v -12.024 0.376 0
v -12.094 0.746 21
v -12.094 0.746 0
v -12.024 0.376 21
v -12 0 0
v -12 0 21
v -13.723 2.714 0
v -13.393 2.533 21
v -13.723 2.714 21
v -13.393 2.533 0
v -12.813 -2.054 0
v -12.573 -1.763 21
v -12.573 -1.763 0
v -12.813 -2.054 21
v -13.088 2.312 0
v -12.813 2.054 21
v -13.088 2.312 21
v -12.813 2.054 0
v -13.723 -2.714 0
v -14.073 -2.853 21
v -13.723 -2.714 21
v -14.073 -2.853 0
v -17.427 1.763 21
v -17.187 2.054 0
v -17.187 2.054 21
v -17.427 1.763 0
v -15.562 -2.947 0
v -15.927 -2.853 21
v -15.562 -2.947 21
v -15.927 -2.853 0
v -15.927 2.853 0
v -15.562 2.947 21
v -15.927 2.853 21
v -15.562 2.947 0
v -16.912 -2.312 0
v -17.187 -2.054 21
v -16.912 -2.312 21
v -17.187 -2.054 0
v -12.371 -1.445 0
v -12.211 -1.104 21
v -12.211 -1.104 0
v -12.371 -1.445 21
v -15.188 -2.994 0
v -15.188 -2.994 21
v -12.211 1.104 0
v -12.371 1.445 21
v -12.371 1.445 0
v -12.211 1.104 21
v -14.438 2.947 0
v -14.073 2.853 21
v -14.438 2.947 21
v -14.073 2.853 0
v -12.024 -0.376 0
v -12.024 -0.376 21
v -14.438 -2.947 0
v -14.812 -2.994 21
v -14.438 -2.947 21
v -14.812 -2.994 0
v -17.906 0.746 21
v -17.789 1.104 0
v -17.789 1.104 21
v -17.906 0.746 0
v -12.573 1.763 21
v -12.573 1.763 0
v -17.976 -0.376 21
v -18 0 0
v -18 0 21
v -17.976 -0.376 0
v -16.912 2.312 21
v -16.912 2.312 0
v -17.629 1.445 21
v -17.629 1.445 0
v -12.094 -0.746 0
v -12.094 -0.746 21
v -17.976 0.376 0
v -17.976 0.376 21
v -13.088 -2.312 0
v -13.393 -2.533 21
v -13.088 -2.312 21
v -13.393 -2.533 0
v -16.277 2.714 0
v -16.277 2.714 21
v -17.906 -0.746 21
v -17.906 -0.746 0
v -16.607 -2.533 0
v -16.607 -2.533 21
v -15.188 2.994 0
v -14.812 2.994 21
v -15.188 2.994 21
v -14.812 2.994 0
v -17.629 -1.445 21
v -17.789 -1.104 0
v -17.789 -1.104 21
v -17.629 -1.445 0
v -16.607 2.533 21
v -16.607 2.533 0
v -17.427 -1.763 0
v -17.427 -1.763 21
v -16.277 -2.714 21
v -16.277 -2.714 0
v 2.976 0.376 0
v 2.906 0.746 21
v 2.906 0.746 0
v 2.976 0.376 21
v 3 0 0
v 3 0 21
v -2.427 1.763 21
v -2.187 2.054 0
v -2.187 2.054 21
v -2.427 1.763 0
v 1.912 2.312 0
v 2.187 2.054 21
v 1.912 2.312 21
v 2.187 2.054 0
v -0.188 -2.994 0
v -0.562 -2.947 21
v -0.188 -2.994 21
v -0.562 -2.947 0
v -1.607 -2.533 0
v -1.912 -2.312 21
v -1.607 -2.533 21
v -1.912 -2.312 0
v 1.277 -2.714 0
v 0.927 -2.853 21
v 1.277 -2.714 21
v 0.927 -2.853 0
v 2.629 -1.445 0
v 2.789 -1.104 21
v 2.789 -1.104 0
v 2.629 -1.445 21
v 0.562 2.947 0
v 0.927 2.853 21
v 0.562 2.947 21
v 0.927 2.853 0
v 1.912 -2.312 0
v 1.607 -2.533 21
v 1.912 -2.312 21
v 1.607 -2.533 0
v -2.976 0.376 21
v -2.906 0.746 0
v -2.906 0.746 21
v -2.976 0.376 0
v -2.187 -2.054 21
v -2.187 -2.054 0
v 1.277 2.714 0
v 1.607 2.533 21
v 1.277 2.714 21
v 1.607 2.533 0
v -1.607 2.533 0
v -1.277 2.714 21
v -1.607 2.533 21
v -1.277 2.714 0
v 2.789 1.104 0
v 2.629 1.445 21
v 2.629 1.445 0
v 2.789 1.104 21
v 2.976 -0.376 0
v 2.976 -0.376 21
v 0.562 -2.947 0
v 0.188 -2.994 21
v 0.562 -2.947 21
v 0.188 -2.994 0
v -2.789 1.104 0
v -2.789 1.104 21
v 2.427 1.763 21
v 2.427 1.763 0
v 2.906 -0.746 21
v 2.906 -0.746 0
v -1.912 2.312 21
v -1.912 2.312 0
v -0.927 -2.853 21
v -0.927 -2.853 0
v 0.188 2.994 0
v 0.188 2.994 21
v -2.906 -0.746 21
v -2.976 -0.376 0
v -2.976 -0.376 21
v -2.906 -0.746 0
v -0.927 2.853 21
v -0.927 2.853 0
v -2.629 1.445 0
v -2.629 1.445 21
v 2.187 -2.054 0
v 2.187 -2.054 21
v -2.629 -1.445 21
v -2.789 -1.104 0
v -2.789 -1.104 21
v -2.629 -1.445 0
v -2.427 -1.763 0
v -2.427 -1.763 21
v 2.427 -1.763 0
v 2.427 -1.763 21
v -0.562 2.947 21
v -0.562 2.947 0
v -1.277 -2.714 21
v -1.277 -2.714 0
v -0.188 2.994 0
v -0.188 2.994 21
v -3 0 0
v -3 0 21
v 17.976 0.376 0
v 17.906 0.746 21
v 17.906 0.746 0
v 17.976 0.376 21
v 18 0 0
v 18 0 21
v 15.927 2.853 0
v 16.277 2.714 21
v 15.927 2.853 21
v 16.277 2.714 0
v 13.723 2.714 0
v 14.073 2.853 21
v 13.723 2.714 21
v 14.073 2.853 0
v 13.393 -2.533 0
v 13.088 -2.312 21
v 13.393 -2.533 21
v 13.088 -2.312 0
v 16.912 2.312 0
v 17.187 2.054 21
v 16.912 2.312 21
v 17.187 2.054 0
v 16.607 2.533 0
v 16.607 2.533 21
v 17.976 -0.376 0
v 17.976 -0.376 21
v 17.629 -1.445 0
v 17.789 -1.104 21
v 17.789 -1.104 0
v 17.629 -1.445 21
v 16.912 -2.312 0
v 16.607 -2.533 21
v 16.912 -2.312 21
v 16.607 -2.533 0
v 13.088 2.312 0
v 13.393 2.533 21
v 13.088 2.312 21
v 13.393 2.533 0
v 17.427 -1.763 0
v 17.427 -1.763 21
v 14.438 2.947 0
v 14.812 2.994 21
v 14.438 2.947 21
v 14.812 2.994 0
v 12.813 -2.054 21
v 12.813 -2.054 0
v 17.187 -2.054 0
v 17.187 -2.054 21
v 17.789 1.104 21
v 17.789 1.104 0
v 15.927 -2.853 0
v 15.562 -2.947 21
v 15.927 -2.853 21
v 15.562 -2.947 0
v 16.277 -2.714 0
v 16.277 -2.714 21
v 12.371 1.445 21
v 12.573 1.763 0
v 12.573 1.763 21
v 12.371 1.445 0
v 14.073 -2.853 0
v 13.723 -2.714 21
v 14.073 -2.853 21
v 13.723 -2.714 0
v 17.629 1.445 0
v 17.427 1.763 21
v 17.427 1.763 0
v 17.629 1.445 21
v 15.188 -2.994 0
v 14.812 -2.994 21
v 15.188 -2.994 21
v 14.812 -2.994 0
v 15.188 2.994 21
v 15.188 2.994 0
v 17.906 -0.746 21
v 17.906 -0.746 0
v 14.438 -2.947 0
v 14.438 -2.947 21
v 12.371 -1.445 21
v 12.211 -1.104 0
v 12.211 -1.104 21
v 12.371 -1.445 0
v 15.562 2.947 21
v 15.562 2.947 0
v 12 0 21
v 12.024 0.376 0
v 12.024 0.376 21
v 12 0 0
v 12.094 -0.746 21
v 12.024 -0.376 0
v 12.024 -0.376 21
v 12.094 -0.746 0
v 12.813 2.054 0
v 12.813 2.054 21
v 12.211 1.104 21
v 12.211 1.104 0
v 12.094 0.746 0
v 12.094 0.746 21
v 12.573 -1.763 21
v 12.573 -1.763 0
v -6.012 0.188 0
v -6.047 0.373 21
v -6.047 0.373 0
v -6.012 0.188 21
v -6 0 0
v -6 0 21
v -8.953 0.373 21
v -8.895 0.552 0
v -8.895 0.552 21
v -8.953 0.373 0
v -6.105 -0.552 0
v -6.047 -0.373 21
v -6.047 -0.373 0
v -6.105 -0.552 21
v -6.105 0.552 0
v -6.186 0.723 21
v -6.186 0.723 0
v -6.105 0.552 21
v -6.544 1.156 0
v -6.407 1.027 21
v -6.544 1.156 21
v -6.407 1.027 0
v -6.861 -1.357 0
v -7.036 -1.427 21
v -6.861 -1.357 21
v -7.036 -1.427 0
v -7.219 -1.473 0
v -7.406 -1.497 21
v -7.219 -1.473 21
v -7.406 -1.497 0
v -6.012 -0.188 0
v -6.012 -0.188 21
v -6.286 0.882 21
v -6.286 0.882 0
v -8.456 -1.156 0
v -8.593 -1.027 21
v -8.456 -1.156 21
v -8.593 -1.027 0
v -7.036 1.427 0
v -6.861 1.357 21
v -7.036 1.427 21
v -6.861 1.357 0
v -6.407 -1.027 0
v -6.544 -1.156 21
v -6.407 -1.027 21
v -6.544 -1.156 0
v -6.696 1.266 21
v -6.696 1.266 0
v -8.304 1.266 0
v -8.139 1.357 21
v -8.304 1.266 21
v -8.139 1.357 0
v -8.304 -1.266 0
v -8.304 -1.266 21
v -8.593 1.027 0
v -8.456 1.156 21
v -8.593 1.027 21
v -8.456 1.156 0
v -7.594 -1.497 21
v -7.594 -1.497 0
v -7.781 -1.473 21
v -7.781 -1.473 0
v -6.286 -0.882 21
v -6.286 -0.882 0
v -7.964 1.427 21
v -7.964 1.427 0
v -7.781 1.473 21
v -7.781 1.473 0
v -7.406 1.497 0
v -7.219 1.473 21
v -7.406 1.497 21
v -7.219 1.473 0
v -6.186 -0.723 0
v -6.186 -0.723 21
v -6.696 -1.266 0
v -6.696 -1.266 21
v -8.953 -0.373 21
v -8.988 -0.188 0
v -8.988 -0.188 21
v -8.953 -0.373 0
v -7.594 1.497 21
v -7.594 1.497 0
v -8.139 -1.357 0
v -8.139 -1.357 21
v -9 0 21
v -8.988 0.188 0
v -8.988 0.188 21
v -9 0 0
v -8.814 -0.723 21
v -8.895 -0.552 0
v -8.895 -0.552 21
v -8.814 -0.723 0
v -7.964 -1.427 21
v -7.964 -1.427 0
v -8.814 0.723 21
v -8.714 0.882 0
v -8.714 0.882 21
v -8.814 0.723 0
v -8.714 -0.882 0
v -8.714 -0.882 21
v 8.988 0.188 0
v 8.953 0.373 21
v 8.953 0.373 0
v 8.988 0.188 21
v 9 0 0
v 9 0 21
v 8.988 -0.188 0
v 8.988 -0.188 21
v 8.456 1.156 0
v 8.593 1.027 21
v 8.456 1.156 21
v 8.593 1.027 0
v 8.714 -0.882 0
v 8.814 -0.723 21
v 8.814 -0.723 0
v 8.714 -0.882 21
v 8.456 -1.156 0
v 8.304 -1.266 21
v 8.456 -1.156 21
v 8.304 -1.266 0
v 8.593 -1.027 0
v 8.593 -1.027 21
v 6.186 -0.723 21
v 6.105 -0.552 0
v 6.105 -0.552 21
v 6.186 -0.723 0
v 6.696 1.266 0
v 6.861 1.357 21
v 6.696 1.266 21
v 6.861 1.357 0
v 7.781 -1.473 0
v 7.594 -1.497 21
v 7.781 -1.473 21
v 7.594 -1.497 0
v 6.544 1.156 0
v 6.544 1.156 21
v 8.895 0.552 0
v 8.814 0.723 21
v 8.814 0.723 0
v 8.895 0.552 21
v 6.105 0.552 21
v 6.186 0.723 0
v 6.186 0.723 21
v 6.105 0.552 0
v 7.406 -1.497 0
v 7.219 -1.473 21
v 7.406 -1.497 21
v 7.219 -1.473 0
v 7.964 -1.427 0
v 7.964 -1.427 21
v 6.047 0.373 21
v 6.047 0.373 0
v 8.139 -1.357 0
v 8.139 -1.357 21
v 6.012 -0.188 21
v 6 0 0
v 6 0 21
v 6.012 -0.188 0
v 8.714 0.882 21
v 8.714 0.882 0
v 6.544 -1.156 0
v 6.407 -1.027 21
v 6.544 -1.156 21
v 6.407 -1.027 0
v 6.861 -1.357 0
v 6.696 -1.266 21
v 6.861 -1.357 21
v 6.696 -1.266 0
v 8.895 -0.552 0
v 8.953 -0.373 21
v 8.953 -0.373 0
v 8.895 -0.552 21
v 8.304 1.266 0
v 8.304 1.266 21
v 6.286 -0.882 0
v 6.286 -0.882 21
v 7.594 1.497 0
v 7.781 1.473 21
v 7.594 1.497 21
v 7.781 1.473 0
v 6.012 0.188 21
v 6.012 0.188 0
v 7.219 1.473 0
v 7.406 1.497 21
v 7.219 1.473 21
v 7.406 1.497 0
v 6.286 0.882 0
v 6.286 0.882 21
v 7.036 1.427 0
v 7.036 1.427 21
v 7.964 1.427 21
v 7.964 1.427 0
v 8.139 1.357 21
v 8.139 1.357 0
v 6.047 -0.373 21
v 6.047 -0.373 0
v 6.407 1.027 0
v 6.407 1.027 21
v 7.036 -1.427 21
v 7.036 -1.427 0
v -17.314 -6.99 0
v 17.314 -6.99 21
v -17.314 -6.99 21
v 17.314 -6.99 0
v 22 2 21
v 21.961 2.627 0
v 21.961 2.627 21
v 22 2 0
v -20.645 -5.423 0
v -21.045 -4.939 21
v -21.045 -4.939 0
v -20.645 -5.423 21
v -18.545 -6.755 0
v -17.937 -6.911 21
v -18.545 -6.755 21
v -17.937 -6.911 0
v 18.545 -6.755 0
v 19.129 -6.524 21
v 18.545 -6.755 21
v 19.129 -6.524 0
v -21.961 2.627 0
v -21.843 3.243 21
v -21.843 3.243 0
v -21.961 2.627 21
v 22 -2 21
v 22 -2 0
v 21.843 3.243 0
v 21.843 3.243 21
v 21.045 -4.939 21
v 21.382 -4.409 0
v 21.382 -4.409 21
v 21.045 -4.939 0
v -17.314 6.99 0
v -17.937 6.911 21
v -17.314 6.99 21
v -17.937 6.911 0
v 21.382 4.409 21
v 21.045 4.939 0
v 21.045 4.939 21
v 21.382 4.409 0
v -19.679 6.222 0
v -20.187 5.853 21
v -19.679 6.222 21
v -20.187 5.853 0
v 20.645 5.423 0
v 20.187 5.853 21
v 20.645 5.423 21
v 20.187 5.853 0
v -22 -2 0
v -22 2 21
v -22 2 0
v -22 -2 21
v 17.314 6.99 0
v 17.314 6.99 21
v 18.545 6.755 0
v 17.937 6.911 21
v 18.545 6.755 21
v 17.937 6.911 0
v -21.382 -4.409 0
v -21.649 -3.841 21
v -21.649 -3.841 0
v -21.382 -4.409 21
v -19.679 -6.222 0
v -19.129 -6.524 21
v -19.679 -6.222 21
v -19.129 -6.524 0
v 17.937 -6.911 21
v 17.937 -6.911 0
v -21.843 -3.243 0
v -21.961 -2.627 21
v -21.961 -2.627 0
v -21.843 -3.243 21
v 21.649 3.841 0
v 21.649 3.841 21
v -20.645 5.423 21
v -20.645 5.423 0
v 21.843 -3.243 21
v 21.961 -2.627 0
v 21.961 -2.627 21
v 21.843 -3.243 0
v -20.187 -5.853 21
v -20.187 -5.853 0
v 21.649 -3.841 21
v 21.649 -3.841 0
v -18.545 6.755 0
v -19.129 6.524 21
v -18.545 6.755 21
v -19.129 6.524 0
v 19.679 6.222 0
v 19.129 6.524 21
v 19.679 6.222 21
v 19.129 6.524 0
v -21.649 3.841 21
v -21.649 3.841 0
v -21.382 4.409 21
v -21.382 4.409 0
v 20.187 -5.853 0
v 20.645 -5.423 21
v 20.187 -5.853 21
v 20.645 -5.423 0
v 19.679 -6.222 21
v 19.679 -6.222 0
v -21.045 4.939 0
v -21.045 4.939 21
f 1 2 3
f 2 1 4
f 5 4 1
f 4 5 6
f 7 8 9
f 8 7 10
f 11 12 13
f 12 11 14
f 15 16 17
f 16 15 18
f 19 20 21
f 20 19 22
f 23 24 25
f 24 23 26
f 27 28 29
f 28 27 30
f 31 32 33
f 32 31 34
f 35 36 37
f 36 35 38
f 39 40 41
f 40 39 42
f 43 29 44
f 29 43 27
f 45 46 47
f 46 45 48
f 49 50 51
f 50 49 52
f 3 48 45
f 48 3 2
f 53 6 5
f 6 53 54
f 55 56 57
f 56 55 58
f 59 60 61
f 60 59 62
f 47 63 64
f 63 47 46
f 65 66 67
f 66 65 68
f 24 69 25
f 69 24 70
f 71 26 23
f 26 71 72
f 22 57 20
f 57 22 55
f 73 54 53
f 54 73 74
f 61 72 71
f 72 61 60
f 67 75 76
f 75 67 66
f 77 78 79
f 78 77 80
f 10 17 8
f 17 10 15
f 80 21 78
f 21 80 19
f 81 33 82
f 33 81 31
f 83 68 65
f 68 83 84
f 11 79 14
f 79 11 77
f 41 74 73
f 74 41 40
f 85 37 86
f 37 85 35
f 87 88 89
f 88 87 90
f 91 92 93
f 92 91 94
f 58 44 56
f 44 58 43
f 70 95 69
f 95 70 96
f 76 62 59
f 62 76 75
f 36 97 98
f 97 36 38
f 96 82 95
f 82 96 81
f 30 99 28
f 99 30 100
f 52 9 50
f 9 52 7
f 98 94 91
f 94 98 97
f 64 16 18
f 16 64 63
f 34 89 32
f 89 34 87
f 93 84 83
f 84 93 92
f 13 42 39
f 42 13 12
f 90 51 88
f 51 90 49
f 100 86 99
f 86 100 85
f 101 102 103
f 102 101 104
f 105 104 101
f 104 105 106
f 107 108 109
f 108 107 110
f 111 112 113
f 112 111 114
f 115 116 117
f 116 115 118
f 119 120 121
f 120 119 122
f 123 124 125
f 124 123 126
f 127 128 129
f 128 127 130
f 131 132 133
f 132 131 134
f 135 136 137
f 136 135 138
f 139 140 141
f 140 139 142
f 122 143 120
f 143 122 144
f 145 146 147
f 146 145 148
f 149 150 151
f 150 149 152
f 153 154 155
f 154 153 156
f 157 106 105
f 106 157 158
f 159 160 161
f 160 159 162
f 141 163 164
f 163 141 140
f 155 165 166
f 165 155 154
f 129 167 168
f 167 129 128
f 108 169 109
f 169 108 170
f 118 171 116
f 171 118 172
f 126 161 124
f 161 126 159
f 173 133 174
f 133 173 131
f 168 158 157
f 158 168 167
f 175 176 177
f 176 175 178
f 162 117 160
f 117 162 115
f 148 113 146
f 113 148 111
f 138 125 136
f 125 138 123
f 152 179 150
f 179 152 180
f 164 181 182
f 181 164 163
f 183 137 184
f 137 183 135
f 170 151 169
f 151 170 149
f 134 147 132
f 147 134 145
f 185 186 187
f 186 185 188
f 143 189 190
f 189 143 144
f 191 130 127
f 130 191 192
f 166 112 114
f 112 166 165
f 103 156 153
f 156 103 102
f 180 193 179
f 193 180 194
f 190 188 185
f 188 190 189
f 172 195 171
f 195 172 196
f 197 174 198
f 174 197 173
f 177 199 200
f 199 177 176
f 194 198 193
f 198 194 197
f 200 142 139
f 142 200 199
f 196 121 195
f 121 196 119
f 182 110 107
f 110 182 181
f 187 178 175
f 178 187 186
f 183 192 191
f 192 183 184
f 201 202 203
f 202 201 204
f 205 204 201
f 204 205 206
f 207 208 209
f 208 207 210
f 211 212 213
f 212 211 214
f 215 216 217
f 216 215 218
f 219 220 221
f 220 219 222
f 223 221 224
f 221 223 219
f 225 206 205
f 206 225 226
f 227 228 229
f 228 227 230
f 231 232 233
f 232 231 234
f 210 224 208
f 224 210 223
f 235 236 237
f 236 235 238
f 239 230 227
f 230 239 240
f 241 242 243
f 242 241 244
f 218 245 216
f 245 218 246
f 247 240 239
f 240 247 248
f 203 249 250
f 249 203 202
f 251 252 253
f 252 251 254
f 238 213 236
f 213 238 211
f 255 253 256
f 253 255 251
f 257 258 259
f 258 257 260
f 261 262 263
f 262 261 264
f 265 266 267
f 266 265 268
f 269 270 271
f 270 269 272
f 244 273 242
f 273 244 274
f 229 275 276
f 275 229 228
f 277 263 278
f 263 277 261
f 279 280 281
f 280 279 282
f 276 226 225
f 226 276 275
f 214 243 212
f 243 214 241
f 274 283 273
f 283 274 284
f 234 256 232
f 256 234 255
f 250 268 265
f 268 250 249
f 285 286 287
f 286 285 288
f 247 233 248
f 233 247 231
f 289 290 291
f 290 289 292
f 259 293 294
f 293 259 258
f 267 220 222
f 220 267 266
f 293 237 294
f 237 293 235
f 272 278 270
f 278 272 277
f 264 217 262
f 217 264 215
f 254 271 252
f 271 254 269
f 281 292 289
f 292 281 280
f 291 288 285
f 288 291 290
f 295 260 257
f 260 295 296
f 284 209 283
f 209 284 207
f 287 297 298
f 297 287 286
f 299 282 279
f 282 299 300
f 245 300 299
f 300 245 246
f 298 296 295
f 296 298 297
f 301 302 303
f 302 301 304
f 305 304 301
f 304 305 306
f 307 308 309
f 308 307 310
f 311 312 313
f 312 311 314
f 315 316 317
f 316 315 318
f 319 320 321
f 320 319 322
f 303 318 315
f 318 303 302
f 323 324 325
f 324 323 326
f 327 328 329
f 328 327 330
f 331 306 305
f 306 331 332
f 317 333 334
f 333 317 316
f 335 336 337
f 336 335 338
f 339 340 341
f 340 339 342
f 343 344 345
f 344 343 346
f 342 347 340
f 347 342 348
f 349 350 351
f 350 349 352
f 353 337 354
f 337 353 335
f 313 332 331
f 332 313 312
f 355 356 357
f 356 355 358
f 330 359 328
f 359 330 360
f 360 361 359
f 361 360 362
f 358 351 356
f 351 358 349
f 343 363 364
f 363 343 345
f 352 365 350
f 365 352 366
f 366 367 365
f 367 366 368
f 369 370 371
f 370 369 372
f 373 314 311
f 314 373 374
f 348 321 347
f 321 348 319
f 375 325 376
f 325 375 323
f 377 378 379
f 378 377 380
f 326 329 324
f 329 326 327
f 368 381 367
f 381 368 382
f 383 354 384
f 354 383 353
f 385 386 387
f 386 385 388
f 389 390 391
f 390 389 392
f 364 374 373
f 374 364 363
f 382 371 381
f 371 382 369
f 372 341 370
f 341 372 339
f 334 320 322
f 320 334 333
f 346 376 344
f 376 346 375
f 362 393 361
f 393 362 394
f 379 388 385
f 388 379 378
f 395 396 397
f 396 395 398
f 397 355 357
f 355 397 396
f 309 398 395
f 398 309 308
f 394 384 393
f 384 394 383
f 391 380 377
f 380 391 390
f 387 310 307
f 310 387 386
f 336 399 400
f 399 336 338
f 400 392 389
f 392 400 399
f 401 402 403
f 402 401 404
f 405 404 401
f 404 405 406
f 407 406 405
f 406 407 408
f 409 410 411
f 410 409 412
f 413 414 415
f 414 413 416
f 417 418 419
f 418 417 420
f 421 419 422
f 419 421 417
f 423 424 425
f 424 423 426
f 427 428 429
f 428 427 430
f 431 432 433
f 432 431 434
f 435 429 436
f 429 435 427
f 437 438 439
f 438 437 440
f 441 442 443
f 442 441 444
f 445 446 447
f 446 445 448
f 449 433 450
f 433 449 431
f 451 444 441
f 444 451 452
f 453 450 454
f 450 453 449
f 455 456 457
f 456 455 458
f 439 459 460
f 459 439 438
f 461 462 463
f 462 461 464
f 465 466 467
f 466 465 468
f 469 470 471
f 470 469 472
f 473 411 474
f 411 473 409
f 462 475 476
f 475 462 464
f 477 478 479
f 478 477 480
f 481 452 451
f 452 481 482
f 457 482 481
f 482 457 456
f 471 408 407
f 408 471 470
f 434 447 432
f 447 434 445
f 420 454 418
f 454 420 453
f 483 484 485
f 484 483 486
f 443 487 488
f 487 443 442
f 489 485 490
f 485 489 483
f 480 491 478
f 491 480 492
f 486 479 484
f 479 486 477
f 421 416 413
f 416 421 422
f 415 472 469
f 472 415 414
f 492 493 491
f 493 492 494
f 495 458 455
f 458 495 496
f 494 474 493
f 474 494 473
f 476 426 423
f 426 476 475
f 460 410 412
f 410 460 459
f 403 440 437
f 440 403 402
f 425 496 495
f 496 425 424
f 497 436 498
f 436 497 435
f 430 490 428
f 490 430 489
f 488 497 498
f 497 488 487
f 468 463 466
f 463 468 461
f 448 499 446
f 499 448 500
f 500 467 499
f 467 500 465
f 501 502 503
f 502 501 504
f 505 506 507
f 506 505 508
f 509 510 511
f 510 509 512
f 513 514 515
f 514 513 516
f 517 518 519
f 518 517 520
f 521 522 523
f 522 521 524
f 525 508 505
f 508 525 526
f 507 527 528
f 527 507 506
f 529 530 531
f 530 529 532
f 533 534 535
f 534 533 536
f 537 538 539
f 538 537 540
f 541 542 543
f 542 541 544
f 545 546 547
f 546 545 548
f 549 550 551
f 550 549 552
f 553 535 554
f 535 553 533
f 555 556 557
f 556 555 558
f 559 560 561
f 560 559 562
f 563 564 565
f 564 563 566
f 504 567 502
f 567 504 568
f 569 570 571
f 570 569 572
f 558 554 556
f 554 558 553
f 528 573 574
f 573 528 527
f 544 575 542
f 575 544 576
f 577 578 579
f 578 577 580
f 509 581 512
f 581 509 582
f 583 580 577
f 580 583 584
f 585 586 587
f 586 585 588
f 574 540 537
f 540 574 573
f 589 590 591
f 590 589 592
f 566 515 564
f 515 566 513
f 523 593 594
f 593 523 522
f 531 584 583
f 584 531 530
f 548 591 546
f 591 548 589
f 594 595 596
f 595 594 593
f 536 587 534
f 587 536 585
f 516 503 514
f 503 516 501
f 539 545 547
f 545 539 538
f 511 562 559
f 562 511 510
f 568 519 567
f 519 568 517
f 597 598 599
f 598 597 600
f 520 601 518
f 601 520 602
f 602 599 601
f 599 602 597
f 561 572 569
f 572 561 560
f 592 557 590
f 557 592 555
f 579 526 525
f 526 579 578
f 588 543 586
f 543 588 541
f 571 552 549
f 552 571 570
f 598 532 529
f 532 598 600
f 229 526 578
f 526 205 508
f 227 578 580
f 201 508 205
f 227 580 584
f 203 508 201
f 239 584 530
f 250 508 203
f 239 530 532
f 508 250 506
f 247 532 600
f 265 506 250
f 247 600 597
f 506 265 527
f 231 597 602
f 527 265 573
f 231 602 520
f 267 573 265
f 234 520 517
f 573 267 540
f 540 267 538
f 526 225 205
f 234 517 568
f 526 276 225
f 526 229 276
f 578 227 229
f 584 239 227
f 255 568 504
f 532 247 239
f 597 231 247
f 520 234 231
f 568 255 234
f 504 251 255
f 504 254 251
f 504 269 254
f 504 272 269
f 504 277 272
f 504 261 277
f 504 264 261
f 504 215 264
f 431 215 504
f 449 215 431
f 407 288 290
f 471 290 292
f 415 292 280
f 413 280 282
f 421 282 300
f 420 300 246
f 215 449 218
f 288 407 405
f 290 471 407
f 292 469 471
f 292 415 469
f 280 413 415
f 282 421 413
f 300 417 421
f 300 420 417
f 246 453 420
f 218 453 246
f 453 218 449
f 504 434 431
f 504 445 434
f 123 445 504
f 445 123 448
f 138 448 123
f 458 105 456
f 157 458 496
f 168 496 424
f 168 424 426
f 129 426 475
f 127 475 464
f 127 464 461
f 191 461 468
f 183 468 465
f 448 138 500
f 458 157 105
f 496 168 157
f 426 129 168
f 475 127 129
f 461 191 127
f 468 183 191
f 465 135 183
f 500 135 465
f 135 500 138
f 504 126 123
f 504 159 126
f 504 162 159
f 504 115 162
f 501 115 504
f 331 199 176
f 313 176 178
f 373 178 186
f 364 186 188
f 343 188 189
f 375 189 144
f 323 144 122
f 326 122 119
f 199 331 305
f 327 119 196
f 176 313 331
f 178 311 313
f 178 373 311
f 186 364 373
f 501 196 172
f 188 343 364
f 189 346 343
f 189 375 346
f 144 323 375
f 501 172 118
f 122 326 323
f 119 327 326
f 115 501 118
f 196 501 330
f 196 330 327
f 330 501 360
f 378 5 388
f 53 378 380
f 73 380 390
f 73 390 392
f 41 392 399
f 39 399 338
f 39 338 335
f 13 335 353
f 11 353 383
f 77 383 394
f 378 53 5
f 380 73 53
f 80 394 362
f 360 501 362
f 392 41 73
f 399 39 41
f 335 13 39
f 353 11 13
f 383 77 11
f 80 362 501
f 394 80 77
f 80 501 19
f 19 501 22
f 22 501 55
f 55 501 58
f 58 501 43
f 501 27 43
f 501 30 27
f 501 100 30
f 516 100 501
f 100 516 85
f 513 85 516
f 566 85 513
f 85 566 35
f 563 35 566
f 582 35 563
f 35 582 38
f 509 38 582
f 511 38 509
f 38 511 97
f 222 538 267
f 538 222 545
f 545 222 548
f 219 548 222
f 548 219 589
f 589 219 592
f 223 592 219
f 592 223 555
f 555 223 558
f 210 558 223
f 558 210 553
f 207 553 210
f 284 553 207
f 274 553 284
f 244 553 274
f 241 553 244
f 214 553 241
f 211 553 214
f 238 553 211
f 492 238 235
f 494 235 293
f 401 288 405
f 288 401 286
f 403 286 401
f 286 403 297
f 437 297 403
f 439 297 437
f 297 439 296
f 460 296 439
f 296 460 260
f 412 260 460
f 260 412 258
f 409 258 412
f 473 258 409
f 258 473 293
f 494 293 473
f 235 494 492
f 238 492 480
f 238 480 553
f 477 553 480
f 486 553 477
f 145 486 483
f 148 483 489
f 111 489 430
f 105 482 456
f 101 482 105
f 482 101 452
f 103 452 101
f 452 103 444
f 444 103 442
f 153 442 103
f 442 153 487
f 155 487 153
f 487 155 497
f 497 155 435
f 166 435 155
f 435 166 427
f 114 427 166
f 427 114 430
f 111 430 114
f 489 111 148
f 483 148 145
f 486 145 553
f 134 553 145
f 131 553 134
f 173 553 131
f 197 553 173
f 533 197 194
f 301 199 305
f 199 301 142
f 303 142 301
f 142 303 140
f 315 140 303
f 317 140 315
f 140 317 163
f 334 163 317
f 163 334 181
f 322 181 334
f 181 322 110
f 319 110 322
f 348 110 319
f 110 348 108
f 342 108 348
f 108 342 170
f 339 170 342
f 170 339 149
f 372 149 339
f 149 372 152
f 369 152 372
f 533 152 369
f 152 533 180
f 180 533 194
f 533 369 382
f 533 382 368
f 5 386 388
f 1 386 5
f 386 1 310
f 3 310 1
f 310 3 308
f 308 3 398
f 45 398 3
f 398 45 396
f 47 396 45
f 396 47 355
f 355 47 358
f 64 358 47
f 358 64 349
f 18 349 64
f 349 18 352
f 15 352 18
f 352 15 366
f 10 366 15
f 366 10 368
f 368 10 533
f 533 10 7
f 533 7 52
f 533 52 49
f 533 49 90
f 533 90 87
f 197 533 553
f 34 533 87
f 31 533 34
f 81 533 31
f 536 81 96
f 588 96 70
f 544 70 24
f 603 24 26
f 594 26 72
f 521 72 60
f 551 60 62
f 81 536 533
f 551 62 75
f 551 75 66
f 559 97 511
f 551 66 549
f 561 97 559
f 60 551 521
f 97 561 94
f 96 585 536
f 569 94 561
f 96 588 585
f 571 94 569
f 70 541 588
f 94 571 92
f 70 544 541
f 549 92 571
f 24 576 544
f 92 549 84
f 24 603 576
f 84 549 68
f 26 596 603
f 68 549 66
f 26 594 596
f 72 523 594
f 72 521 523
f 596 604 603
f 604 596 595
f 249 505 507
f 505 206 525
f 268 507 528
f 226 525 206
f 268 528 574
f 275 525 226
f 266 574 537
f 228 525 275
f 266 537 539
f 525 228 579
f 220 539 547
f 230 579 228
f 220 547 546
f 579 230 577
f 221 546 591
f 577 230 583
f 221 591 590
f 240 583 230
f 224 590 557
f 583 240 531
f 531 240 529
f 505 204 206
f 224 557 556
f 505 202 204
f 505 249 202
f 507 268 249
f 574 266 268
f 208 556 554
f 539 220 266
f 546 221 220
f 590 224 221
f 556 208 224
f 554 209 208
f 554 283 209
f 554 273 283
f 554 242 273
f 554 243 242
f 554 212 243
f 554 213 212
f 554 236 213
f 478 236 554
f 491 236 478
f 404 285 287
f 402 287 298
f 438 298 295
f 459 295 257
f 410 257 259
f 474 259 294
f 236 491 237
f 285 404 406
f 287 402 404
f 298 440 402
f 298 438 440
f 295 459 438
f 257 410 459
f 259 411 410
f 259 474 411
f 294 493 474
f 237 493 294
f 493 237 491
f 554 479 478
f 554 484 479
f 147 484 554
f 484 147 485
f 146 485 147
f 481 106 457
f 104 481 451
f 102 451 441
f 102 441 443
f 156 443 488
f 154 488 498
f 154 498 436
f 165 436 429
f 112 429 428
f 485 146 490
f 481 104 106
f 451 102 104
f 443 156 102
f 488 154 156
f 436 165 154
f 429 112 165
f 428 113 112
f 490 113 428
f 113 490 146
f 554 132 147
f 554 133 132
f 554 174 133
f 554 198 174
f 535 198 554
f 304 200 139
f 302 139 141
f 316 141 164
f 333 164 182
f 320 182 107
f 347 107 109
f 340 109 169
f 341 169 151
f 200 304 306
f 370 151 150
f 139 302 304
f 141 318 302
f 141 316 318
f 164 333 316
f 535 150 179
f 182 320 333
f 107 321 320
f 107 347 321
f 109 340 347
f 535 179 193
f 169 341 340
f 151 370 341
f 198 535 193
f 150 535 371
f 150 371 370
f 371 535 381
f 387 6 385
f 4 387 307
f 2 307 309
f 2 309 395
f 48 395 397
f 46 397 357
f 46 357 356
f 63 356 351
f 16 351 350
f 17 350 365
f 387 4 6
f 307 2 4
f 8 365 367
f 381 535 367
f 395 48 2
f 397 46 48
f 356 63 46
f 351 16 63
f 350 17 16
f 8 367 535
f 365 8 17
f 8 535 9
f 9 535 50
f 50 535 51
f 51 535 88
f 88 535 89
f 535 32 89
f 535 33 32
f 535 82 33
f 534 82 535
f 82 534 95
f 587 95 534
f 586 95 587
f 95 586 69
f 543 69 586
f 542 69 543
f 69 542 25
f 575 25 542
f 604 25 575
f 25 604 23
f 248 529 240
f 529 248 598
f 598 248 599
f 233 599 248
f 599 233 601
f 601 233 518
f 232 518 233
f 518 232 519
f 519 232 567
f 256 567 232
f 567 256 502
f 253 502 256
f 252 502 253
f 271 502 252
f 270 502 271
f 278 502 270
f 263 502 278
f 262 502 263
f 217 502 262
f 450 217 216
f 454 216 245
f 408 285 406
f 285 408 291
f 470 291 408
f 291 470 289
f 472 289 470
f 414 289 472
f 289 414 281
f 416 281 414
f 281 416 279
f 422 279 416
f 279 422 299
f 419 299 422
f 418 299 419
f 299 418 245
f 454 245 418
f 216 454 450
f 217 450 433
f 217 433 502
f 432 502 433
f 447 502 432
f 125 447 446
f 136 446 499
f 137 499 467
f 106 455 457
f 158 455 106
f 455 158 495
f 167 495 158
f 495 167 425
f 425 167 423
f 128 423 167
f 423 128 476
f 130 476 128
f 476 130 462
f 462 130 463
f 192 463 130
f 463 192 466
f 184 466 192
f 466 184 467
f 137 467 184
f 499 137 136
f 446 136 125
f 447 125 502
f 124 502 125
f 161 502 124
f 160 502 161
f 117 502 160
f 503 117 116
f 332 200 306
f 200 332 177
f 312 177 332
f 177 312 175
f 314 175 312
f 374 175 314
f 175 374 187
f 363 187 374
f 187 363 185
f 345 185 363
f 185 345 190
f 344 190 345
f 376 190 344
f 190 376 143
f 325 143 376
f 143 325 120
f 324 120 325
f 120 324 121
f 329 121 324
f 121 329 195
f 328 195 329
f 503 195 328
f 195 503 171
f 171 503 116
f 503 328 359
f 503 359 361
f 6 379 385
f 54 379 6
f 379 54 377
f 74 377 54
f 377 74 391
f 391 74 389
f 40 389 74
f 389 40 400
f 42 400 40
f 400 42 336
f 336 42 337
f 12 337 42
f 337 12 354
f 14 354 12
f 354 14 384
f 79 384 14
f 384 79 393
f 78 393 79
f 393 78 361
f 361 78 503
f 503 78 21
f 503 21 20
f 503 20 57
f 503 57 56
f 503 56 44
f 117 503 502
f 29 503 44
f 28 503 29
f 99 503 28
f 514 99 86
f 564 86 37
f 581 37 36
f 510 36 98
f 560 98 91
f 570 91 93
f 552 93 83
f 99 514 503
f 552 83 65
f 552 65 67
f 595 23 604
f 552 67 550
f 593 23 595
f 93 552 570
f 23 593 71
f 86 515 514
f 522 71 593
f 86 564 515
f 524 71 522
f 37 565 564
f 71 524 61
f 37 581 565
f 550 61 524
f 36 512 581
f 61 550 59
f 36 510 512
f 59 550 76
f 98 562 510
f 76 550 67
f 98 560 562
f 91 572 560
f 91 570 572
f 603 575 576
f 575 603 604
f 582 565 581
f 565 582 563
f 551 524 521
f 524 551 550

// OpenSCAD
$fn = 50;


difference() {
	union() {
		translate(v = [0, 0, 0]) {
			rotate(a = [0, 0, 0]) {
				hull() {
					translate(v = [-17.0000000000, 2.0000000000, 0]) {
						rotate(a = [0, 0, 0]) {
							translate(v = [0, 0, 0]) {
								rotate(a = [0, 0, 0]) {
									cylinder(h = 21, r = 5);
								}
							}
						}
					}
					translate(v = [17.0000000000, 2.0000000000, 0]) {
						rotate(a = [0, 0, 0]) {
							translate(v = [0, 0, 0]) {
								rotate(a = [0, 0, 0]) {
									cylinder(h = 21, r = 5);
								}
							}
						}
					}
					translate(v = [-17.0000000000, -2.0000000000, 0]) {
						rotate(a = [0, 0, 0]) {
							translate(v = [0, 0, 0]) {
								rotate(a = [0, 0, 0]) {
									cylinder(h = 21, r = 5);
								}
							}
						}
					}
					translate(v = [17.0000000000, -2.0000000000, 0]) {
						rotate(a = [0, 0, 0]) {
							translate(v = [0, 0, 0]) {
								rotate(a = [0, 0, 0]) {
									cylinder(h = 21, r = 5);
								}
							}
						}
					}
				}
			}
		}
	}
	union() {
		translate(v = [-15.0000000000, 0.0000000000, 0]) {
			rotate(a = [0, 0, 0]) {
				translate(v = [0, 0, -50]) {
					rotate(a = [0, 0, 0]) {
						cylinder(h = 100, r = 3.0000000000);
					}
				}
			}
		}
		translate(v = [0.0000000000, 0.0000000000, 0]) {
			rotate(a = [0, 0, 0]) {
				translate(v = [0, 0, -50]) {
					rotate(a = [0, 0, 0]) {
						cylinder(h = 100, r = 3.0000000000);
					}
				}
			}
		}
		translate(v = [15.0000000000, 0.0000000000, 0]) {
			rotate(a = [0, 0, 0]) {
				translate(v = [0, 0, -50]) {
					rotate(a = [0, 0, 0]) {
						cylinder(h = 100, r = 3.0000000000);
					}
				}
			}
		}
		translate(v = [-15.0000000000, 0.0000000000, 0]) {
			rotate(a = [0, 0, 0]) {
				translate(v = [0, 0, -50]) {
					rotate(a = [0, 0, 0]) {
						cylinder(h = 100, r = 1.5000000000);
					}
				}
			}
		}
		translate(v = [-7.5000000000, 0.0000000000, 0]) {
			rotate(a = [0, 0, 0]) {
				translate(v = [0, 0, -50]) {
					rotate(a = [0, 0, 0]) {
						cylinder(h = 100, r = 1.5000000000);
					}
				}
			}
		}
		translate(v = [0.0000000000, 0.0000000000, 0]) {
			rotate(a = [0, 0, 0]) {
				translate(v = [0, 0, -50]) {
					rotate(a = [0, 0, 0]) {
						cylinder(h = 100, r = 1.5000000000);
					}
				}
			}
		}
		translate(v = [7.5000000000, 0.0000000000, 0]) {
			rotate(a = [0, 0, 0]) {
				translate(v = [0, 0, -50]) {
					rotate(a = [0, 0, 0]) {
						cylinder(h = 100, r = 1.5000000000);
					}
				}
			}
		}
		translate(v = [15.0000000000, 0.0000000000, 0]) {
			rotate(a = [0, 0, 0]) {
				translate(v = [0, 0, -50]) {
					rotate(a = [0, 0, 0]) {
						cylinder(h = 100, r = 1.5000000000);
					}
				}
			}
		}
	}
}
